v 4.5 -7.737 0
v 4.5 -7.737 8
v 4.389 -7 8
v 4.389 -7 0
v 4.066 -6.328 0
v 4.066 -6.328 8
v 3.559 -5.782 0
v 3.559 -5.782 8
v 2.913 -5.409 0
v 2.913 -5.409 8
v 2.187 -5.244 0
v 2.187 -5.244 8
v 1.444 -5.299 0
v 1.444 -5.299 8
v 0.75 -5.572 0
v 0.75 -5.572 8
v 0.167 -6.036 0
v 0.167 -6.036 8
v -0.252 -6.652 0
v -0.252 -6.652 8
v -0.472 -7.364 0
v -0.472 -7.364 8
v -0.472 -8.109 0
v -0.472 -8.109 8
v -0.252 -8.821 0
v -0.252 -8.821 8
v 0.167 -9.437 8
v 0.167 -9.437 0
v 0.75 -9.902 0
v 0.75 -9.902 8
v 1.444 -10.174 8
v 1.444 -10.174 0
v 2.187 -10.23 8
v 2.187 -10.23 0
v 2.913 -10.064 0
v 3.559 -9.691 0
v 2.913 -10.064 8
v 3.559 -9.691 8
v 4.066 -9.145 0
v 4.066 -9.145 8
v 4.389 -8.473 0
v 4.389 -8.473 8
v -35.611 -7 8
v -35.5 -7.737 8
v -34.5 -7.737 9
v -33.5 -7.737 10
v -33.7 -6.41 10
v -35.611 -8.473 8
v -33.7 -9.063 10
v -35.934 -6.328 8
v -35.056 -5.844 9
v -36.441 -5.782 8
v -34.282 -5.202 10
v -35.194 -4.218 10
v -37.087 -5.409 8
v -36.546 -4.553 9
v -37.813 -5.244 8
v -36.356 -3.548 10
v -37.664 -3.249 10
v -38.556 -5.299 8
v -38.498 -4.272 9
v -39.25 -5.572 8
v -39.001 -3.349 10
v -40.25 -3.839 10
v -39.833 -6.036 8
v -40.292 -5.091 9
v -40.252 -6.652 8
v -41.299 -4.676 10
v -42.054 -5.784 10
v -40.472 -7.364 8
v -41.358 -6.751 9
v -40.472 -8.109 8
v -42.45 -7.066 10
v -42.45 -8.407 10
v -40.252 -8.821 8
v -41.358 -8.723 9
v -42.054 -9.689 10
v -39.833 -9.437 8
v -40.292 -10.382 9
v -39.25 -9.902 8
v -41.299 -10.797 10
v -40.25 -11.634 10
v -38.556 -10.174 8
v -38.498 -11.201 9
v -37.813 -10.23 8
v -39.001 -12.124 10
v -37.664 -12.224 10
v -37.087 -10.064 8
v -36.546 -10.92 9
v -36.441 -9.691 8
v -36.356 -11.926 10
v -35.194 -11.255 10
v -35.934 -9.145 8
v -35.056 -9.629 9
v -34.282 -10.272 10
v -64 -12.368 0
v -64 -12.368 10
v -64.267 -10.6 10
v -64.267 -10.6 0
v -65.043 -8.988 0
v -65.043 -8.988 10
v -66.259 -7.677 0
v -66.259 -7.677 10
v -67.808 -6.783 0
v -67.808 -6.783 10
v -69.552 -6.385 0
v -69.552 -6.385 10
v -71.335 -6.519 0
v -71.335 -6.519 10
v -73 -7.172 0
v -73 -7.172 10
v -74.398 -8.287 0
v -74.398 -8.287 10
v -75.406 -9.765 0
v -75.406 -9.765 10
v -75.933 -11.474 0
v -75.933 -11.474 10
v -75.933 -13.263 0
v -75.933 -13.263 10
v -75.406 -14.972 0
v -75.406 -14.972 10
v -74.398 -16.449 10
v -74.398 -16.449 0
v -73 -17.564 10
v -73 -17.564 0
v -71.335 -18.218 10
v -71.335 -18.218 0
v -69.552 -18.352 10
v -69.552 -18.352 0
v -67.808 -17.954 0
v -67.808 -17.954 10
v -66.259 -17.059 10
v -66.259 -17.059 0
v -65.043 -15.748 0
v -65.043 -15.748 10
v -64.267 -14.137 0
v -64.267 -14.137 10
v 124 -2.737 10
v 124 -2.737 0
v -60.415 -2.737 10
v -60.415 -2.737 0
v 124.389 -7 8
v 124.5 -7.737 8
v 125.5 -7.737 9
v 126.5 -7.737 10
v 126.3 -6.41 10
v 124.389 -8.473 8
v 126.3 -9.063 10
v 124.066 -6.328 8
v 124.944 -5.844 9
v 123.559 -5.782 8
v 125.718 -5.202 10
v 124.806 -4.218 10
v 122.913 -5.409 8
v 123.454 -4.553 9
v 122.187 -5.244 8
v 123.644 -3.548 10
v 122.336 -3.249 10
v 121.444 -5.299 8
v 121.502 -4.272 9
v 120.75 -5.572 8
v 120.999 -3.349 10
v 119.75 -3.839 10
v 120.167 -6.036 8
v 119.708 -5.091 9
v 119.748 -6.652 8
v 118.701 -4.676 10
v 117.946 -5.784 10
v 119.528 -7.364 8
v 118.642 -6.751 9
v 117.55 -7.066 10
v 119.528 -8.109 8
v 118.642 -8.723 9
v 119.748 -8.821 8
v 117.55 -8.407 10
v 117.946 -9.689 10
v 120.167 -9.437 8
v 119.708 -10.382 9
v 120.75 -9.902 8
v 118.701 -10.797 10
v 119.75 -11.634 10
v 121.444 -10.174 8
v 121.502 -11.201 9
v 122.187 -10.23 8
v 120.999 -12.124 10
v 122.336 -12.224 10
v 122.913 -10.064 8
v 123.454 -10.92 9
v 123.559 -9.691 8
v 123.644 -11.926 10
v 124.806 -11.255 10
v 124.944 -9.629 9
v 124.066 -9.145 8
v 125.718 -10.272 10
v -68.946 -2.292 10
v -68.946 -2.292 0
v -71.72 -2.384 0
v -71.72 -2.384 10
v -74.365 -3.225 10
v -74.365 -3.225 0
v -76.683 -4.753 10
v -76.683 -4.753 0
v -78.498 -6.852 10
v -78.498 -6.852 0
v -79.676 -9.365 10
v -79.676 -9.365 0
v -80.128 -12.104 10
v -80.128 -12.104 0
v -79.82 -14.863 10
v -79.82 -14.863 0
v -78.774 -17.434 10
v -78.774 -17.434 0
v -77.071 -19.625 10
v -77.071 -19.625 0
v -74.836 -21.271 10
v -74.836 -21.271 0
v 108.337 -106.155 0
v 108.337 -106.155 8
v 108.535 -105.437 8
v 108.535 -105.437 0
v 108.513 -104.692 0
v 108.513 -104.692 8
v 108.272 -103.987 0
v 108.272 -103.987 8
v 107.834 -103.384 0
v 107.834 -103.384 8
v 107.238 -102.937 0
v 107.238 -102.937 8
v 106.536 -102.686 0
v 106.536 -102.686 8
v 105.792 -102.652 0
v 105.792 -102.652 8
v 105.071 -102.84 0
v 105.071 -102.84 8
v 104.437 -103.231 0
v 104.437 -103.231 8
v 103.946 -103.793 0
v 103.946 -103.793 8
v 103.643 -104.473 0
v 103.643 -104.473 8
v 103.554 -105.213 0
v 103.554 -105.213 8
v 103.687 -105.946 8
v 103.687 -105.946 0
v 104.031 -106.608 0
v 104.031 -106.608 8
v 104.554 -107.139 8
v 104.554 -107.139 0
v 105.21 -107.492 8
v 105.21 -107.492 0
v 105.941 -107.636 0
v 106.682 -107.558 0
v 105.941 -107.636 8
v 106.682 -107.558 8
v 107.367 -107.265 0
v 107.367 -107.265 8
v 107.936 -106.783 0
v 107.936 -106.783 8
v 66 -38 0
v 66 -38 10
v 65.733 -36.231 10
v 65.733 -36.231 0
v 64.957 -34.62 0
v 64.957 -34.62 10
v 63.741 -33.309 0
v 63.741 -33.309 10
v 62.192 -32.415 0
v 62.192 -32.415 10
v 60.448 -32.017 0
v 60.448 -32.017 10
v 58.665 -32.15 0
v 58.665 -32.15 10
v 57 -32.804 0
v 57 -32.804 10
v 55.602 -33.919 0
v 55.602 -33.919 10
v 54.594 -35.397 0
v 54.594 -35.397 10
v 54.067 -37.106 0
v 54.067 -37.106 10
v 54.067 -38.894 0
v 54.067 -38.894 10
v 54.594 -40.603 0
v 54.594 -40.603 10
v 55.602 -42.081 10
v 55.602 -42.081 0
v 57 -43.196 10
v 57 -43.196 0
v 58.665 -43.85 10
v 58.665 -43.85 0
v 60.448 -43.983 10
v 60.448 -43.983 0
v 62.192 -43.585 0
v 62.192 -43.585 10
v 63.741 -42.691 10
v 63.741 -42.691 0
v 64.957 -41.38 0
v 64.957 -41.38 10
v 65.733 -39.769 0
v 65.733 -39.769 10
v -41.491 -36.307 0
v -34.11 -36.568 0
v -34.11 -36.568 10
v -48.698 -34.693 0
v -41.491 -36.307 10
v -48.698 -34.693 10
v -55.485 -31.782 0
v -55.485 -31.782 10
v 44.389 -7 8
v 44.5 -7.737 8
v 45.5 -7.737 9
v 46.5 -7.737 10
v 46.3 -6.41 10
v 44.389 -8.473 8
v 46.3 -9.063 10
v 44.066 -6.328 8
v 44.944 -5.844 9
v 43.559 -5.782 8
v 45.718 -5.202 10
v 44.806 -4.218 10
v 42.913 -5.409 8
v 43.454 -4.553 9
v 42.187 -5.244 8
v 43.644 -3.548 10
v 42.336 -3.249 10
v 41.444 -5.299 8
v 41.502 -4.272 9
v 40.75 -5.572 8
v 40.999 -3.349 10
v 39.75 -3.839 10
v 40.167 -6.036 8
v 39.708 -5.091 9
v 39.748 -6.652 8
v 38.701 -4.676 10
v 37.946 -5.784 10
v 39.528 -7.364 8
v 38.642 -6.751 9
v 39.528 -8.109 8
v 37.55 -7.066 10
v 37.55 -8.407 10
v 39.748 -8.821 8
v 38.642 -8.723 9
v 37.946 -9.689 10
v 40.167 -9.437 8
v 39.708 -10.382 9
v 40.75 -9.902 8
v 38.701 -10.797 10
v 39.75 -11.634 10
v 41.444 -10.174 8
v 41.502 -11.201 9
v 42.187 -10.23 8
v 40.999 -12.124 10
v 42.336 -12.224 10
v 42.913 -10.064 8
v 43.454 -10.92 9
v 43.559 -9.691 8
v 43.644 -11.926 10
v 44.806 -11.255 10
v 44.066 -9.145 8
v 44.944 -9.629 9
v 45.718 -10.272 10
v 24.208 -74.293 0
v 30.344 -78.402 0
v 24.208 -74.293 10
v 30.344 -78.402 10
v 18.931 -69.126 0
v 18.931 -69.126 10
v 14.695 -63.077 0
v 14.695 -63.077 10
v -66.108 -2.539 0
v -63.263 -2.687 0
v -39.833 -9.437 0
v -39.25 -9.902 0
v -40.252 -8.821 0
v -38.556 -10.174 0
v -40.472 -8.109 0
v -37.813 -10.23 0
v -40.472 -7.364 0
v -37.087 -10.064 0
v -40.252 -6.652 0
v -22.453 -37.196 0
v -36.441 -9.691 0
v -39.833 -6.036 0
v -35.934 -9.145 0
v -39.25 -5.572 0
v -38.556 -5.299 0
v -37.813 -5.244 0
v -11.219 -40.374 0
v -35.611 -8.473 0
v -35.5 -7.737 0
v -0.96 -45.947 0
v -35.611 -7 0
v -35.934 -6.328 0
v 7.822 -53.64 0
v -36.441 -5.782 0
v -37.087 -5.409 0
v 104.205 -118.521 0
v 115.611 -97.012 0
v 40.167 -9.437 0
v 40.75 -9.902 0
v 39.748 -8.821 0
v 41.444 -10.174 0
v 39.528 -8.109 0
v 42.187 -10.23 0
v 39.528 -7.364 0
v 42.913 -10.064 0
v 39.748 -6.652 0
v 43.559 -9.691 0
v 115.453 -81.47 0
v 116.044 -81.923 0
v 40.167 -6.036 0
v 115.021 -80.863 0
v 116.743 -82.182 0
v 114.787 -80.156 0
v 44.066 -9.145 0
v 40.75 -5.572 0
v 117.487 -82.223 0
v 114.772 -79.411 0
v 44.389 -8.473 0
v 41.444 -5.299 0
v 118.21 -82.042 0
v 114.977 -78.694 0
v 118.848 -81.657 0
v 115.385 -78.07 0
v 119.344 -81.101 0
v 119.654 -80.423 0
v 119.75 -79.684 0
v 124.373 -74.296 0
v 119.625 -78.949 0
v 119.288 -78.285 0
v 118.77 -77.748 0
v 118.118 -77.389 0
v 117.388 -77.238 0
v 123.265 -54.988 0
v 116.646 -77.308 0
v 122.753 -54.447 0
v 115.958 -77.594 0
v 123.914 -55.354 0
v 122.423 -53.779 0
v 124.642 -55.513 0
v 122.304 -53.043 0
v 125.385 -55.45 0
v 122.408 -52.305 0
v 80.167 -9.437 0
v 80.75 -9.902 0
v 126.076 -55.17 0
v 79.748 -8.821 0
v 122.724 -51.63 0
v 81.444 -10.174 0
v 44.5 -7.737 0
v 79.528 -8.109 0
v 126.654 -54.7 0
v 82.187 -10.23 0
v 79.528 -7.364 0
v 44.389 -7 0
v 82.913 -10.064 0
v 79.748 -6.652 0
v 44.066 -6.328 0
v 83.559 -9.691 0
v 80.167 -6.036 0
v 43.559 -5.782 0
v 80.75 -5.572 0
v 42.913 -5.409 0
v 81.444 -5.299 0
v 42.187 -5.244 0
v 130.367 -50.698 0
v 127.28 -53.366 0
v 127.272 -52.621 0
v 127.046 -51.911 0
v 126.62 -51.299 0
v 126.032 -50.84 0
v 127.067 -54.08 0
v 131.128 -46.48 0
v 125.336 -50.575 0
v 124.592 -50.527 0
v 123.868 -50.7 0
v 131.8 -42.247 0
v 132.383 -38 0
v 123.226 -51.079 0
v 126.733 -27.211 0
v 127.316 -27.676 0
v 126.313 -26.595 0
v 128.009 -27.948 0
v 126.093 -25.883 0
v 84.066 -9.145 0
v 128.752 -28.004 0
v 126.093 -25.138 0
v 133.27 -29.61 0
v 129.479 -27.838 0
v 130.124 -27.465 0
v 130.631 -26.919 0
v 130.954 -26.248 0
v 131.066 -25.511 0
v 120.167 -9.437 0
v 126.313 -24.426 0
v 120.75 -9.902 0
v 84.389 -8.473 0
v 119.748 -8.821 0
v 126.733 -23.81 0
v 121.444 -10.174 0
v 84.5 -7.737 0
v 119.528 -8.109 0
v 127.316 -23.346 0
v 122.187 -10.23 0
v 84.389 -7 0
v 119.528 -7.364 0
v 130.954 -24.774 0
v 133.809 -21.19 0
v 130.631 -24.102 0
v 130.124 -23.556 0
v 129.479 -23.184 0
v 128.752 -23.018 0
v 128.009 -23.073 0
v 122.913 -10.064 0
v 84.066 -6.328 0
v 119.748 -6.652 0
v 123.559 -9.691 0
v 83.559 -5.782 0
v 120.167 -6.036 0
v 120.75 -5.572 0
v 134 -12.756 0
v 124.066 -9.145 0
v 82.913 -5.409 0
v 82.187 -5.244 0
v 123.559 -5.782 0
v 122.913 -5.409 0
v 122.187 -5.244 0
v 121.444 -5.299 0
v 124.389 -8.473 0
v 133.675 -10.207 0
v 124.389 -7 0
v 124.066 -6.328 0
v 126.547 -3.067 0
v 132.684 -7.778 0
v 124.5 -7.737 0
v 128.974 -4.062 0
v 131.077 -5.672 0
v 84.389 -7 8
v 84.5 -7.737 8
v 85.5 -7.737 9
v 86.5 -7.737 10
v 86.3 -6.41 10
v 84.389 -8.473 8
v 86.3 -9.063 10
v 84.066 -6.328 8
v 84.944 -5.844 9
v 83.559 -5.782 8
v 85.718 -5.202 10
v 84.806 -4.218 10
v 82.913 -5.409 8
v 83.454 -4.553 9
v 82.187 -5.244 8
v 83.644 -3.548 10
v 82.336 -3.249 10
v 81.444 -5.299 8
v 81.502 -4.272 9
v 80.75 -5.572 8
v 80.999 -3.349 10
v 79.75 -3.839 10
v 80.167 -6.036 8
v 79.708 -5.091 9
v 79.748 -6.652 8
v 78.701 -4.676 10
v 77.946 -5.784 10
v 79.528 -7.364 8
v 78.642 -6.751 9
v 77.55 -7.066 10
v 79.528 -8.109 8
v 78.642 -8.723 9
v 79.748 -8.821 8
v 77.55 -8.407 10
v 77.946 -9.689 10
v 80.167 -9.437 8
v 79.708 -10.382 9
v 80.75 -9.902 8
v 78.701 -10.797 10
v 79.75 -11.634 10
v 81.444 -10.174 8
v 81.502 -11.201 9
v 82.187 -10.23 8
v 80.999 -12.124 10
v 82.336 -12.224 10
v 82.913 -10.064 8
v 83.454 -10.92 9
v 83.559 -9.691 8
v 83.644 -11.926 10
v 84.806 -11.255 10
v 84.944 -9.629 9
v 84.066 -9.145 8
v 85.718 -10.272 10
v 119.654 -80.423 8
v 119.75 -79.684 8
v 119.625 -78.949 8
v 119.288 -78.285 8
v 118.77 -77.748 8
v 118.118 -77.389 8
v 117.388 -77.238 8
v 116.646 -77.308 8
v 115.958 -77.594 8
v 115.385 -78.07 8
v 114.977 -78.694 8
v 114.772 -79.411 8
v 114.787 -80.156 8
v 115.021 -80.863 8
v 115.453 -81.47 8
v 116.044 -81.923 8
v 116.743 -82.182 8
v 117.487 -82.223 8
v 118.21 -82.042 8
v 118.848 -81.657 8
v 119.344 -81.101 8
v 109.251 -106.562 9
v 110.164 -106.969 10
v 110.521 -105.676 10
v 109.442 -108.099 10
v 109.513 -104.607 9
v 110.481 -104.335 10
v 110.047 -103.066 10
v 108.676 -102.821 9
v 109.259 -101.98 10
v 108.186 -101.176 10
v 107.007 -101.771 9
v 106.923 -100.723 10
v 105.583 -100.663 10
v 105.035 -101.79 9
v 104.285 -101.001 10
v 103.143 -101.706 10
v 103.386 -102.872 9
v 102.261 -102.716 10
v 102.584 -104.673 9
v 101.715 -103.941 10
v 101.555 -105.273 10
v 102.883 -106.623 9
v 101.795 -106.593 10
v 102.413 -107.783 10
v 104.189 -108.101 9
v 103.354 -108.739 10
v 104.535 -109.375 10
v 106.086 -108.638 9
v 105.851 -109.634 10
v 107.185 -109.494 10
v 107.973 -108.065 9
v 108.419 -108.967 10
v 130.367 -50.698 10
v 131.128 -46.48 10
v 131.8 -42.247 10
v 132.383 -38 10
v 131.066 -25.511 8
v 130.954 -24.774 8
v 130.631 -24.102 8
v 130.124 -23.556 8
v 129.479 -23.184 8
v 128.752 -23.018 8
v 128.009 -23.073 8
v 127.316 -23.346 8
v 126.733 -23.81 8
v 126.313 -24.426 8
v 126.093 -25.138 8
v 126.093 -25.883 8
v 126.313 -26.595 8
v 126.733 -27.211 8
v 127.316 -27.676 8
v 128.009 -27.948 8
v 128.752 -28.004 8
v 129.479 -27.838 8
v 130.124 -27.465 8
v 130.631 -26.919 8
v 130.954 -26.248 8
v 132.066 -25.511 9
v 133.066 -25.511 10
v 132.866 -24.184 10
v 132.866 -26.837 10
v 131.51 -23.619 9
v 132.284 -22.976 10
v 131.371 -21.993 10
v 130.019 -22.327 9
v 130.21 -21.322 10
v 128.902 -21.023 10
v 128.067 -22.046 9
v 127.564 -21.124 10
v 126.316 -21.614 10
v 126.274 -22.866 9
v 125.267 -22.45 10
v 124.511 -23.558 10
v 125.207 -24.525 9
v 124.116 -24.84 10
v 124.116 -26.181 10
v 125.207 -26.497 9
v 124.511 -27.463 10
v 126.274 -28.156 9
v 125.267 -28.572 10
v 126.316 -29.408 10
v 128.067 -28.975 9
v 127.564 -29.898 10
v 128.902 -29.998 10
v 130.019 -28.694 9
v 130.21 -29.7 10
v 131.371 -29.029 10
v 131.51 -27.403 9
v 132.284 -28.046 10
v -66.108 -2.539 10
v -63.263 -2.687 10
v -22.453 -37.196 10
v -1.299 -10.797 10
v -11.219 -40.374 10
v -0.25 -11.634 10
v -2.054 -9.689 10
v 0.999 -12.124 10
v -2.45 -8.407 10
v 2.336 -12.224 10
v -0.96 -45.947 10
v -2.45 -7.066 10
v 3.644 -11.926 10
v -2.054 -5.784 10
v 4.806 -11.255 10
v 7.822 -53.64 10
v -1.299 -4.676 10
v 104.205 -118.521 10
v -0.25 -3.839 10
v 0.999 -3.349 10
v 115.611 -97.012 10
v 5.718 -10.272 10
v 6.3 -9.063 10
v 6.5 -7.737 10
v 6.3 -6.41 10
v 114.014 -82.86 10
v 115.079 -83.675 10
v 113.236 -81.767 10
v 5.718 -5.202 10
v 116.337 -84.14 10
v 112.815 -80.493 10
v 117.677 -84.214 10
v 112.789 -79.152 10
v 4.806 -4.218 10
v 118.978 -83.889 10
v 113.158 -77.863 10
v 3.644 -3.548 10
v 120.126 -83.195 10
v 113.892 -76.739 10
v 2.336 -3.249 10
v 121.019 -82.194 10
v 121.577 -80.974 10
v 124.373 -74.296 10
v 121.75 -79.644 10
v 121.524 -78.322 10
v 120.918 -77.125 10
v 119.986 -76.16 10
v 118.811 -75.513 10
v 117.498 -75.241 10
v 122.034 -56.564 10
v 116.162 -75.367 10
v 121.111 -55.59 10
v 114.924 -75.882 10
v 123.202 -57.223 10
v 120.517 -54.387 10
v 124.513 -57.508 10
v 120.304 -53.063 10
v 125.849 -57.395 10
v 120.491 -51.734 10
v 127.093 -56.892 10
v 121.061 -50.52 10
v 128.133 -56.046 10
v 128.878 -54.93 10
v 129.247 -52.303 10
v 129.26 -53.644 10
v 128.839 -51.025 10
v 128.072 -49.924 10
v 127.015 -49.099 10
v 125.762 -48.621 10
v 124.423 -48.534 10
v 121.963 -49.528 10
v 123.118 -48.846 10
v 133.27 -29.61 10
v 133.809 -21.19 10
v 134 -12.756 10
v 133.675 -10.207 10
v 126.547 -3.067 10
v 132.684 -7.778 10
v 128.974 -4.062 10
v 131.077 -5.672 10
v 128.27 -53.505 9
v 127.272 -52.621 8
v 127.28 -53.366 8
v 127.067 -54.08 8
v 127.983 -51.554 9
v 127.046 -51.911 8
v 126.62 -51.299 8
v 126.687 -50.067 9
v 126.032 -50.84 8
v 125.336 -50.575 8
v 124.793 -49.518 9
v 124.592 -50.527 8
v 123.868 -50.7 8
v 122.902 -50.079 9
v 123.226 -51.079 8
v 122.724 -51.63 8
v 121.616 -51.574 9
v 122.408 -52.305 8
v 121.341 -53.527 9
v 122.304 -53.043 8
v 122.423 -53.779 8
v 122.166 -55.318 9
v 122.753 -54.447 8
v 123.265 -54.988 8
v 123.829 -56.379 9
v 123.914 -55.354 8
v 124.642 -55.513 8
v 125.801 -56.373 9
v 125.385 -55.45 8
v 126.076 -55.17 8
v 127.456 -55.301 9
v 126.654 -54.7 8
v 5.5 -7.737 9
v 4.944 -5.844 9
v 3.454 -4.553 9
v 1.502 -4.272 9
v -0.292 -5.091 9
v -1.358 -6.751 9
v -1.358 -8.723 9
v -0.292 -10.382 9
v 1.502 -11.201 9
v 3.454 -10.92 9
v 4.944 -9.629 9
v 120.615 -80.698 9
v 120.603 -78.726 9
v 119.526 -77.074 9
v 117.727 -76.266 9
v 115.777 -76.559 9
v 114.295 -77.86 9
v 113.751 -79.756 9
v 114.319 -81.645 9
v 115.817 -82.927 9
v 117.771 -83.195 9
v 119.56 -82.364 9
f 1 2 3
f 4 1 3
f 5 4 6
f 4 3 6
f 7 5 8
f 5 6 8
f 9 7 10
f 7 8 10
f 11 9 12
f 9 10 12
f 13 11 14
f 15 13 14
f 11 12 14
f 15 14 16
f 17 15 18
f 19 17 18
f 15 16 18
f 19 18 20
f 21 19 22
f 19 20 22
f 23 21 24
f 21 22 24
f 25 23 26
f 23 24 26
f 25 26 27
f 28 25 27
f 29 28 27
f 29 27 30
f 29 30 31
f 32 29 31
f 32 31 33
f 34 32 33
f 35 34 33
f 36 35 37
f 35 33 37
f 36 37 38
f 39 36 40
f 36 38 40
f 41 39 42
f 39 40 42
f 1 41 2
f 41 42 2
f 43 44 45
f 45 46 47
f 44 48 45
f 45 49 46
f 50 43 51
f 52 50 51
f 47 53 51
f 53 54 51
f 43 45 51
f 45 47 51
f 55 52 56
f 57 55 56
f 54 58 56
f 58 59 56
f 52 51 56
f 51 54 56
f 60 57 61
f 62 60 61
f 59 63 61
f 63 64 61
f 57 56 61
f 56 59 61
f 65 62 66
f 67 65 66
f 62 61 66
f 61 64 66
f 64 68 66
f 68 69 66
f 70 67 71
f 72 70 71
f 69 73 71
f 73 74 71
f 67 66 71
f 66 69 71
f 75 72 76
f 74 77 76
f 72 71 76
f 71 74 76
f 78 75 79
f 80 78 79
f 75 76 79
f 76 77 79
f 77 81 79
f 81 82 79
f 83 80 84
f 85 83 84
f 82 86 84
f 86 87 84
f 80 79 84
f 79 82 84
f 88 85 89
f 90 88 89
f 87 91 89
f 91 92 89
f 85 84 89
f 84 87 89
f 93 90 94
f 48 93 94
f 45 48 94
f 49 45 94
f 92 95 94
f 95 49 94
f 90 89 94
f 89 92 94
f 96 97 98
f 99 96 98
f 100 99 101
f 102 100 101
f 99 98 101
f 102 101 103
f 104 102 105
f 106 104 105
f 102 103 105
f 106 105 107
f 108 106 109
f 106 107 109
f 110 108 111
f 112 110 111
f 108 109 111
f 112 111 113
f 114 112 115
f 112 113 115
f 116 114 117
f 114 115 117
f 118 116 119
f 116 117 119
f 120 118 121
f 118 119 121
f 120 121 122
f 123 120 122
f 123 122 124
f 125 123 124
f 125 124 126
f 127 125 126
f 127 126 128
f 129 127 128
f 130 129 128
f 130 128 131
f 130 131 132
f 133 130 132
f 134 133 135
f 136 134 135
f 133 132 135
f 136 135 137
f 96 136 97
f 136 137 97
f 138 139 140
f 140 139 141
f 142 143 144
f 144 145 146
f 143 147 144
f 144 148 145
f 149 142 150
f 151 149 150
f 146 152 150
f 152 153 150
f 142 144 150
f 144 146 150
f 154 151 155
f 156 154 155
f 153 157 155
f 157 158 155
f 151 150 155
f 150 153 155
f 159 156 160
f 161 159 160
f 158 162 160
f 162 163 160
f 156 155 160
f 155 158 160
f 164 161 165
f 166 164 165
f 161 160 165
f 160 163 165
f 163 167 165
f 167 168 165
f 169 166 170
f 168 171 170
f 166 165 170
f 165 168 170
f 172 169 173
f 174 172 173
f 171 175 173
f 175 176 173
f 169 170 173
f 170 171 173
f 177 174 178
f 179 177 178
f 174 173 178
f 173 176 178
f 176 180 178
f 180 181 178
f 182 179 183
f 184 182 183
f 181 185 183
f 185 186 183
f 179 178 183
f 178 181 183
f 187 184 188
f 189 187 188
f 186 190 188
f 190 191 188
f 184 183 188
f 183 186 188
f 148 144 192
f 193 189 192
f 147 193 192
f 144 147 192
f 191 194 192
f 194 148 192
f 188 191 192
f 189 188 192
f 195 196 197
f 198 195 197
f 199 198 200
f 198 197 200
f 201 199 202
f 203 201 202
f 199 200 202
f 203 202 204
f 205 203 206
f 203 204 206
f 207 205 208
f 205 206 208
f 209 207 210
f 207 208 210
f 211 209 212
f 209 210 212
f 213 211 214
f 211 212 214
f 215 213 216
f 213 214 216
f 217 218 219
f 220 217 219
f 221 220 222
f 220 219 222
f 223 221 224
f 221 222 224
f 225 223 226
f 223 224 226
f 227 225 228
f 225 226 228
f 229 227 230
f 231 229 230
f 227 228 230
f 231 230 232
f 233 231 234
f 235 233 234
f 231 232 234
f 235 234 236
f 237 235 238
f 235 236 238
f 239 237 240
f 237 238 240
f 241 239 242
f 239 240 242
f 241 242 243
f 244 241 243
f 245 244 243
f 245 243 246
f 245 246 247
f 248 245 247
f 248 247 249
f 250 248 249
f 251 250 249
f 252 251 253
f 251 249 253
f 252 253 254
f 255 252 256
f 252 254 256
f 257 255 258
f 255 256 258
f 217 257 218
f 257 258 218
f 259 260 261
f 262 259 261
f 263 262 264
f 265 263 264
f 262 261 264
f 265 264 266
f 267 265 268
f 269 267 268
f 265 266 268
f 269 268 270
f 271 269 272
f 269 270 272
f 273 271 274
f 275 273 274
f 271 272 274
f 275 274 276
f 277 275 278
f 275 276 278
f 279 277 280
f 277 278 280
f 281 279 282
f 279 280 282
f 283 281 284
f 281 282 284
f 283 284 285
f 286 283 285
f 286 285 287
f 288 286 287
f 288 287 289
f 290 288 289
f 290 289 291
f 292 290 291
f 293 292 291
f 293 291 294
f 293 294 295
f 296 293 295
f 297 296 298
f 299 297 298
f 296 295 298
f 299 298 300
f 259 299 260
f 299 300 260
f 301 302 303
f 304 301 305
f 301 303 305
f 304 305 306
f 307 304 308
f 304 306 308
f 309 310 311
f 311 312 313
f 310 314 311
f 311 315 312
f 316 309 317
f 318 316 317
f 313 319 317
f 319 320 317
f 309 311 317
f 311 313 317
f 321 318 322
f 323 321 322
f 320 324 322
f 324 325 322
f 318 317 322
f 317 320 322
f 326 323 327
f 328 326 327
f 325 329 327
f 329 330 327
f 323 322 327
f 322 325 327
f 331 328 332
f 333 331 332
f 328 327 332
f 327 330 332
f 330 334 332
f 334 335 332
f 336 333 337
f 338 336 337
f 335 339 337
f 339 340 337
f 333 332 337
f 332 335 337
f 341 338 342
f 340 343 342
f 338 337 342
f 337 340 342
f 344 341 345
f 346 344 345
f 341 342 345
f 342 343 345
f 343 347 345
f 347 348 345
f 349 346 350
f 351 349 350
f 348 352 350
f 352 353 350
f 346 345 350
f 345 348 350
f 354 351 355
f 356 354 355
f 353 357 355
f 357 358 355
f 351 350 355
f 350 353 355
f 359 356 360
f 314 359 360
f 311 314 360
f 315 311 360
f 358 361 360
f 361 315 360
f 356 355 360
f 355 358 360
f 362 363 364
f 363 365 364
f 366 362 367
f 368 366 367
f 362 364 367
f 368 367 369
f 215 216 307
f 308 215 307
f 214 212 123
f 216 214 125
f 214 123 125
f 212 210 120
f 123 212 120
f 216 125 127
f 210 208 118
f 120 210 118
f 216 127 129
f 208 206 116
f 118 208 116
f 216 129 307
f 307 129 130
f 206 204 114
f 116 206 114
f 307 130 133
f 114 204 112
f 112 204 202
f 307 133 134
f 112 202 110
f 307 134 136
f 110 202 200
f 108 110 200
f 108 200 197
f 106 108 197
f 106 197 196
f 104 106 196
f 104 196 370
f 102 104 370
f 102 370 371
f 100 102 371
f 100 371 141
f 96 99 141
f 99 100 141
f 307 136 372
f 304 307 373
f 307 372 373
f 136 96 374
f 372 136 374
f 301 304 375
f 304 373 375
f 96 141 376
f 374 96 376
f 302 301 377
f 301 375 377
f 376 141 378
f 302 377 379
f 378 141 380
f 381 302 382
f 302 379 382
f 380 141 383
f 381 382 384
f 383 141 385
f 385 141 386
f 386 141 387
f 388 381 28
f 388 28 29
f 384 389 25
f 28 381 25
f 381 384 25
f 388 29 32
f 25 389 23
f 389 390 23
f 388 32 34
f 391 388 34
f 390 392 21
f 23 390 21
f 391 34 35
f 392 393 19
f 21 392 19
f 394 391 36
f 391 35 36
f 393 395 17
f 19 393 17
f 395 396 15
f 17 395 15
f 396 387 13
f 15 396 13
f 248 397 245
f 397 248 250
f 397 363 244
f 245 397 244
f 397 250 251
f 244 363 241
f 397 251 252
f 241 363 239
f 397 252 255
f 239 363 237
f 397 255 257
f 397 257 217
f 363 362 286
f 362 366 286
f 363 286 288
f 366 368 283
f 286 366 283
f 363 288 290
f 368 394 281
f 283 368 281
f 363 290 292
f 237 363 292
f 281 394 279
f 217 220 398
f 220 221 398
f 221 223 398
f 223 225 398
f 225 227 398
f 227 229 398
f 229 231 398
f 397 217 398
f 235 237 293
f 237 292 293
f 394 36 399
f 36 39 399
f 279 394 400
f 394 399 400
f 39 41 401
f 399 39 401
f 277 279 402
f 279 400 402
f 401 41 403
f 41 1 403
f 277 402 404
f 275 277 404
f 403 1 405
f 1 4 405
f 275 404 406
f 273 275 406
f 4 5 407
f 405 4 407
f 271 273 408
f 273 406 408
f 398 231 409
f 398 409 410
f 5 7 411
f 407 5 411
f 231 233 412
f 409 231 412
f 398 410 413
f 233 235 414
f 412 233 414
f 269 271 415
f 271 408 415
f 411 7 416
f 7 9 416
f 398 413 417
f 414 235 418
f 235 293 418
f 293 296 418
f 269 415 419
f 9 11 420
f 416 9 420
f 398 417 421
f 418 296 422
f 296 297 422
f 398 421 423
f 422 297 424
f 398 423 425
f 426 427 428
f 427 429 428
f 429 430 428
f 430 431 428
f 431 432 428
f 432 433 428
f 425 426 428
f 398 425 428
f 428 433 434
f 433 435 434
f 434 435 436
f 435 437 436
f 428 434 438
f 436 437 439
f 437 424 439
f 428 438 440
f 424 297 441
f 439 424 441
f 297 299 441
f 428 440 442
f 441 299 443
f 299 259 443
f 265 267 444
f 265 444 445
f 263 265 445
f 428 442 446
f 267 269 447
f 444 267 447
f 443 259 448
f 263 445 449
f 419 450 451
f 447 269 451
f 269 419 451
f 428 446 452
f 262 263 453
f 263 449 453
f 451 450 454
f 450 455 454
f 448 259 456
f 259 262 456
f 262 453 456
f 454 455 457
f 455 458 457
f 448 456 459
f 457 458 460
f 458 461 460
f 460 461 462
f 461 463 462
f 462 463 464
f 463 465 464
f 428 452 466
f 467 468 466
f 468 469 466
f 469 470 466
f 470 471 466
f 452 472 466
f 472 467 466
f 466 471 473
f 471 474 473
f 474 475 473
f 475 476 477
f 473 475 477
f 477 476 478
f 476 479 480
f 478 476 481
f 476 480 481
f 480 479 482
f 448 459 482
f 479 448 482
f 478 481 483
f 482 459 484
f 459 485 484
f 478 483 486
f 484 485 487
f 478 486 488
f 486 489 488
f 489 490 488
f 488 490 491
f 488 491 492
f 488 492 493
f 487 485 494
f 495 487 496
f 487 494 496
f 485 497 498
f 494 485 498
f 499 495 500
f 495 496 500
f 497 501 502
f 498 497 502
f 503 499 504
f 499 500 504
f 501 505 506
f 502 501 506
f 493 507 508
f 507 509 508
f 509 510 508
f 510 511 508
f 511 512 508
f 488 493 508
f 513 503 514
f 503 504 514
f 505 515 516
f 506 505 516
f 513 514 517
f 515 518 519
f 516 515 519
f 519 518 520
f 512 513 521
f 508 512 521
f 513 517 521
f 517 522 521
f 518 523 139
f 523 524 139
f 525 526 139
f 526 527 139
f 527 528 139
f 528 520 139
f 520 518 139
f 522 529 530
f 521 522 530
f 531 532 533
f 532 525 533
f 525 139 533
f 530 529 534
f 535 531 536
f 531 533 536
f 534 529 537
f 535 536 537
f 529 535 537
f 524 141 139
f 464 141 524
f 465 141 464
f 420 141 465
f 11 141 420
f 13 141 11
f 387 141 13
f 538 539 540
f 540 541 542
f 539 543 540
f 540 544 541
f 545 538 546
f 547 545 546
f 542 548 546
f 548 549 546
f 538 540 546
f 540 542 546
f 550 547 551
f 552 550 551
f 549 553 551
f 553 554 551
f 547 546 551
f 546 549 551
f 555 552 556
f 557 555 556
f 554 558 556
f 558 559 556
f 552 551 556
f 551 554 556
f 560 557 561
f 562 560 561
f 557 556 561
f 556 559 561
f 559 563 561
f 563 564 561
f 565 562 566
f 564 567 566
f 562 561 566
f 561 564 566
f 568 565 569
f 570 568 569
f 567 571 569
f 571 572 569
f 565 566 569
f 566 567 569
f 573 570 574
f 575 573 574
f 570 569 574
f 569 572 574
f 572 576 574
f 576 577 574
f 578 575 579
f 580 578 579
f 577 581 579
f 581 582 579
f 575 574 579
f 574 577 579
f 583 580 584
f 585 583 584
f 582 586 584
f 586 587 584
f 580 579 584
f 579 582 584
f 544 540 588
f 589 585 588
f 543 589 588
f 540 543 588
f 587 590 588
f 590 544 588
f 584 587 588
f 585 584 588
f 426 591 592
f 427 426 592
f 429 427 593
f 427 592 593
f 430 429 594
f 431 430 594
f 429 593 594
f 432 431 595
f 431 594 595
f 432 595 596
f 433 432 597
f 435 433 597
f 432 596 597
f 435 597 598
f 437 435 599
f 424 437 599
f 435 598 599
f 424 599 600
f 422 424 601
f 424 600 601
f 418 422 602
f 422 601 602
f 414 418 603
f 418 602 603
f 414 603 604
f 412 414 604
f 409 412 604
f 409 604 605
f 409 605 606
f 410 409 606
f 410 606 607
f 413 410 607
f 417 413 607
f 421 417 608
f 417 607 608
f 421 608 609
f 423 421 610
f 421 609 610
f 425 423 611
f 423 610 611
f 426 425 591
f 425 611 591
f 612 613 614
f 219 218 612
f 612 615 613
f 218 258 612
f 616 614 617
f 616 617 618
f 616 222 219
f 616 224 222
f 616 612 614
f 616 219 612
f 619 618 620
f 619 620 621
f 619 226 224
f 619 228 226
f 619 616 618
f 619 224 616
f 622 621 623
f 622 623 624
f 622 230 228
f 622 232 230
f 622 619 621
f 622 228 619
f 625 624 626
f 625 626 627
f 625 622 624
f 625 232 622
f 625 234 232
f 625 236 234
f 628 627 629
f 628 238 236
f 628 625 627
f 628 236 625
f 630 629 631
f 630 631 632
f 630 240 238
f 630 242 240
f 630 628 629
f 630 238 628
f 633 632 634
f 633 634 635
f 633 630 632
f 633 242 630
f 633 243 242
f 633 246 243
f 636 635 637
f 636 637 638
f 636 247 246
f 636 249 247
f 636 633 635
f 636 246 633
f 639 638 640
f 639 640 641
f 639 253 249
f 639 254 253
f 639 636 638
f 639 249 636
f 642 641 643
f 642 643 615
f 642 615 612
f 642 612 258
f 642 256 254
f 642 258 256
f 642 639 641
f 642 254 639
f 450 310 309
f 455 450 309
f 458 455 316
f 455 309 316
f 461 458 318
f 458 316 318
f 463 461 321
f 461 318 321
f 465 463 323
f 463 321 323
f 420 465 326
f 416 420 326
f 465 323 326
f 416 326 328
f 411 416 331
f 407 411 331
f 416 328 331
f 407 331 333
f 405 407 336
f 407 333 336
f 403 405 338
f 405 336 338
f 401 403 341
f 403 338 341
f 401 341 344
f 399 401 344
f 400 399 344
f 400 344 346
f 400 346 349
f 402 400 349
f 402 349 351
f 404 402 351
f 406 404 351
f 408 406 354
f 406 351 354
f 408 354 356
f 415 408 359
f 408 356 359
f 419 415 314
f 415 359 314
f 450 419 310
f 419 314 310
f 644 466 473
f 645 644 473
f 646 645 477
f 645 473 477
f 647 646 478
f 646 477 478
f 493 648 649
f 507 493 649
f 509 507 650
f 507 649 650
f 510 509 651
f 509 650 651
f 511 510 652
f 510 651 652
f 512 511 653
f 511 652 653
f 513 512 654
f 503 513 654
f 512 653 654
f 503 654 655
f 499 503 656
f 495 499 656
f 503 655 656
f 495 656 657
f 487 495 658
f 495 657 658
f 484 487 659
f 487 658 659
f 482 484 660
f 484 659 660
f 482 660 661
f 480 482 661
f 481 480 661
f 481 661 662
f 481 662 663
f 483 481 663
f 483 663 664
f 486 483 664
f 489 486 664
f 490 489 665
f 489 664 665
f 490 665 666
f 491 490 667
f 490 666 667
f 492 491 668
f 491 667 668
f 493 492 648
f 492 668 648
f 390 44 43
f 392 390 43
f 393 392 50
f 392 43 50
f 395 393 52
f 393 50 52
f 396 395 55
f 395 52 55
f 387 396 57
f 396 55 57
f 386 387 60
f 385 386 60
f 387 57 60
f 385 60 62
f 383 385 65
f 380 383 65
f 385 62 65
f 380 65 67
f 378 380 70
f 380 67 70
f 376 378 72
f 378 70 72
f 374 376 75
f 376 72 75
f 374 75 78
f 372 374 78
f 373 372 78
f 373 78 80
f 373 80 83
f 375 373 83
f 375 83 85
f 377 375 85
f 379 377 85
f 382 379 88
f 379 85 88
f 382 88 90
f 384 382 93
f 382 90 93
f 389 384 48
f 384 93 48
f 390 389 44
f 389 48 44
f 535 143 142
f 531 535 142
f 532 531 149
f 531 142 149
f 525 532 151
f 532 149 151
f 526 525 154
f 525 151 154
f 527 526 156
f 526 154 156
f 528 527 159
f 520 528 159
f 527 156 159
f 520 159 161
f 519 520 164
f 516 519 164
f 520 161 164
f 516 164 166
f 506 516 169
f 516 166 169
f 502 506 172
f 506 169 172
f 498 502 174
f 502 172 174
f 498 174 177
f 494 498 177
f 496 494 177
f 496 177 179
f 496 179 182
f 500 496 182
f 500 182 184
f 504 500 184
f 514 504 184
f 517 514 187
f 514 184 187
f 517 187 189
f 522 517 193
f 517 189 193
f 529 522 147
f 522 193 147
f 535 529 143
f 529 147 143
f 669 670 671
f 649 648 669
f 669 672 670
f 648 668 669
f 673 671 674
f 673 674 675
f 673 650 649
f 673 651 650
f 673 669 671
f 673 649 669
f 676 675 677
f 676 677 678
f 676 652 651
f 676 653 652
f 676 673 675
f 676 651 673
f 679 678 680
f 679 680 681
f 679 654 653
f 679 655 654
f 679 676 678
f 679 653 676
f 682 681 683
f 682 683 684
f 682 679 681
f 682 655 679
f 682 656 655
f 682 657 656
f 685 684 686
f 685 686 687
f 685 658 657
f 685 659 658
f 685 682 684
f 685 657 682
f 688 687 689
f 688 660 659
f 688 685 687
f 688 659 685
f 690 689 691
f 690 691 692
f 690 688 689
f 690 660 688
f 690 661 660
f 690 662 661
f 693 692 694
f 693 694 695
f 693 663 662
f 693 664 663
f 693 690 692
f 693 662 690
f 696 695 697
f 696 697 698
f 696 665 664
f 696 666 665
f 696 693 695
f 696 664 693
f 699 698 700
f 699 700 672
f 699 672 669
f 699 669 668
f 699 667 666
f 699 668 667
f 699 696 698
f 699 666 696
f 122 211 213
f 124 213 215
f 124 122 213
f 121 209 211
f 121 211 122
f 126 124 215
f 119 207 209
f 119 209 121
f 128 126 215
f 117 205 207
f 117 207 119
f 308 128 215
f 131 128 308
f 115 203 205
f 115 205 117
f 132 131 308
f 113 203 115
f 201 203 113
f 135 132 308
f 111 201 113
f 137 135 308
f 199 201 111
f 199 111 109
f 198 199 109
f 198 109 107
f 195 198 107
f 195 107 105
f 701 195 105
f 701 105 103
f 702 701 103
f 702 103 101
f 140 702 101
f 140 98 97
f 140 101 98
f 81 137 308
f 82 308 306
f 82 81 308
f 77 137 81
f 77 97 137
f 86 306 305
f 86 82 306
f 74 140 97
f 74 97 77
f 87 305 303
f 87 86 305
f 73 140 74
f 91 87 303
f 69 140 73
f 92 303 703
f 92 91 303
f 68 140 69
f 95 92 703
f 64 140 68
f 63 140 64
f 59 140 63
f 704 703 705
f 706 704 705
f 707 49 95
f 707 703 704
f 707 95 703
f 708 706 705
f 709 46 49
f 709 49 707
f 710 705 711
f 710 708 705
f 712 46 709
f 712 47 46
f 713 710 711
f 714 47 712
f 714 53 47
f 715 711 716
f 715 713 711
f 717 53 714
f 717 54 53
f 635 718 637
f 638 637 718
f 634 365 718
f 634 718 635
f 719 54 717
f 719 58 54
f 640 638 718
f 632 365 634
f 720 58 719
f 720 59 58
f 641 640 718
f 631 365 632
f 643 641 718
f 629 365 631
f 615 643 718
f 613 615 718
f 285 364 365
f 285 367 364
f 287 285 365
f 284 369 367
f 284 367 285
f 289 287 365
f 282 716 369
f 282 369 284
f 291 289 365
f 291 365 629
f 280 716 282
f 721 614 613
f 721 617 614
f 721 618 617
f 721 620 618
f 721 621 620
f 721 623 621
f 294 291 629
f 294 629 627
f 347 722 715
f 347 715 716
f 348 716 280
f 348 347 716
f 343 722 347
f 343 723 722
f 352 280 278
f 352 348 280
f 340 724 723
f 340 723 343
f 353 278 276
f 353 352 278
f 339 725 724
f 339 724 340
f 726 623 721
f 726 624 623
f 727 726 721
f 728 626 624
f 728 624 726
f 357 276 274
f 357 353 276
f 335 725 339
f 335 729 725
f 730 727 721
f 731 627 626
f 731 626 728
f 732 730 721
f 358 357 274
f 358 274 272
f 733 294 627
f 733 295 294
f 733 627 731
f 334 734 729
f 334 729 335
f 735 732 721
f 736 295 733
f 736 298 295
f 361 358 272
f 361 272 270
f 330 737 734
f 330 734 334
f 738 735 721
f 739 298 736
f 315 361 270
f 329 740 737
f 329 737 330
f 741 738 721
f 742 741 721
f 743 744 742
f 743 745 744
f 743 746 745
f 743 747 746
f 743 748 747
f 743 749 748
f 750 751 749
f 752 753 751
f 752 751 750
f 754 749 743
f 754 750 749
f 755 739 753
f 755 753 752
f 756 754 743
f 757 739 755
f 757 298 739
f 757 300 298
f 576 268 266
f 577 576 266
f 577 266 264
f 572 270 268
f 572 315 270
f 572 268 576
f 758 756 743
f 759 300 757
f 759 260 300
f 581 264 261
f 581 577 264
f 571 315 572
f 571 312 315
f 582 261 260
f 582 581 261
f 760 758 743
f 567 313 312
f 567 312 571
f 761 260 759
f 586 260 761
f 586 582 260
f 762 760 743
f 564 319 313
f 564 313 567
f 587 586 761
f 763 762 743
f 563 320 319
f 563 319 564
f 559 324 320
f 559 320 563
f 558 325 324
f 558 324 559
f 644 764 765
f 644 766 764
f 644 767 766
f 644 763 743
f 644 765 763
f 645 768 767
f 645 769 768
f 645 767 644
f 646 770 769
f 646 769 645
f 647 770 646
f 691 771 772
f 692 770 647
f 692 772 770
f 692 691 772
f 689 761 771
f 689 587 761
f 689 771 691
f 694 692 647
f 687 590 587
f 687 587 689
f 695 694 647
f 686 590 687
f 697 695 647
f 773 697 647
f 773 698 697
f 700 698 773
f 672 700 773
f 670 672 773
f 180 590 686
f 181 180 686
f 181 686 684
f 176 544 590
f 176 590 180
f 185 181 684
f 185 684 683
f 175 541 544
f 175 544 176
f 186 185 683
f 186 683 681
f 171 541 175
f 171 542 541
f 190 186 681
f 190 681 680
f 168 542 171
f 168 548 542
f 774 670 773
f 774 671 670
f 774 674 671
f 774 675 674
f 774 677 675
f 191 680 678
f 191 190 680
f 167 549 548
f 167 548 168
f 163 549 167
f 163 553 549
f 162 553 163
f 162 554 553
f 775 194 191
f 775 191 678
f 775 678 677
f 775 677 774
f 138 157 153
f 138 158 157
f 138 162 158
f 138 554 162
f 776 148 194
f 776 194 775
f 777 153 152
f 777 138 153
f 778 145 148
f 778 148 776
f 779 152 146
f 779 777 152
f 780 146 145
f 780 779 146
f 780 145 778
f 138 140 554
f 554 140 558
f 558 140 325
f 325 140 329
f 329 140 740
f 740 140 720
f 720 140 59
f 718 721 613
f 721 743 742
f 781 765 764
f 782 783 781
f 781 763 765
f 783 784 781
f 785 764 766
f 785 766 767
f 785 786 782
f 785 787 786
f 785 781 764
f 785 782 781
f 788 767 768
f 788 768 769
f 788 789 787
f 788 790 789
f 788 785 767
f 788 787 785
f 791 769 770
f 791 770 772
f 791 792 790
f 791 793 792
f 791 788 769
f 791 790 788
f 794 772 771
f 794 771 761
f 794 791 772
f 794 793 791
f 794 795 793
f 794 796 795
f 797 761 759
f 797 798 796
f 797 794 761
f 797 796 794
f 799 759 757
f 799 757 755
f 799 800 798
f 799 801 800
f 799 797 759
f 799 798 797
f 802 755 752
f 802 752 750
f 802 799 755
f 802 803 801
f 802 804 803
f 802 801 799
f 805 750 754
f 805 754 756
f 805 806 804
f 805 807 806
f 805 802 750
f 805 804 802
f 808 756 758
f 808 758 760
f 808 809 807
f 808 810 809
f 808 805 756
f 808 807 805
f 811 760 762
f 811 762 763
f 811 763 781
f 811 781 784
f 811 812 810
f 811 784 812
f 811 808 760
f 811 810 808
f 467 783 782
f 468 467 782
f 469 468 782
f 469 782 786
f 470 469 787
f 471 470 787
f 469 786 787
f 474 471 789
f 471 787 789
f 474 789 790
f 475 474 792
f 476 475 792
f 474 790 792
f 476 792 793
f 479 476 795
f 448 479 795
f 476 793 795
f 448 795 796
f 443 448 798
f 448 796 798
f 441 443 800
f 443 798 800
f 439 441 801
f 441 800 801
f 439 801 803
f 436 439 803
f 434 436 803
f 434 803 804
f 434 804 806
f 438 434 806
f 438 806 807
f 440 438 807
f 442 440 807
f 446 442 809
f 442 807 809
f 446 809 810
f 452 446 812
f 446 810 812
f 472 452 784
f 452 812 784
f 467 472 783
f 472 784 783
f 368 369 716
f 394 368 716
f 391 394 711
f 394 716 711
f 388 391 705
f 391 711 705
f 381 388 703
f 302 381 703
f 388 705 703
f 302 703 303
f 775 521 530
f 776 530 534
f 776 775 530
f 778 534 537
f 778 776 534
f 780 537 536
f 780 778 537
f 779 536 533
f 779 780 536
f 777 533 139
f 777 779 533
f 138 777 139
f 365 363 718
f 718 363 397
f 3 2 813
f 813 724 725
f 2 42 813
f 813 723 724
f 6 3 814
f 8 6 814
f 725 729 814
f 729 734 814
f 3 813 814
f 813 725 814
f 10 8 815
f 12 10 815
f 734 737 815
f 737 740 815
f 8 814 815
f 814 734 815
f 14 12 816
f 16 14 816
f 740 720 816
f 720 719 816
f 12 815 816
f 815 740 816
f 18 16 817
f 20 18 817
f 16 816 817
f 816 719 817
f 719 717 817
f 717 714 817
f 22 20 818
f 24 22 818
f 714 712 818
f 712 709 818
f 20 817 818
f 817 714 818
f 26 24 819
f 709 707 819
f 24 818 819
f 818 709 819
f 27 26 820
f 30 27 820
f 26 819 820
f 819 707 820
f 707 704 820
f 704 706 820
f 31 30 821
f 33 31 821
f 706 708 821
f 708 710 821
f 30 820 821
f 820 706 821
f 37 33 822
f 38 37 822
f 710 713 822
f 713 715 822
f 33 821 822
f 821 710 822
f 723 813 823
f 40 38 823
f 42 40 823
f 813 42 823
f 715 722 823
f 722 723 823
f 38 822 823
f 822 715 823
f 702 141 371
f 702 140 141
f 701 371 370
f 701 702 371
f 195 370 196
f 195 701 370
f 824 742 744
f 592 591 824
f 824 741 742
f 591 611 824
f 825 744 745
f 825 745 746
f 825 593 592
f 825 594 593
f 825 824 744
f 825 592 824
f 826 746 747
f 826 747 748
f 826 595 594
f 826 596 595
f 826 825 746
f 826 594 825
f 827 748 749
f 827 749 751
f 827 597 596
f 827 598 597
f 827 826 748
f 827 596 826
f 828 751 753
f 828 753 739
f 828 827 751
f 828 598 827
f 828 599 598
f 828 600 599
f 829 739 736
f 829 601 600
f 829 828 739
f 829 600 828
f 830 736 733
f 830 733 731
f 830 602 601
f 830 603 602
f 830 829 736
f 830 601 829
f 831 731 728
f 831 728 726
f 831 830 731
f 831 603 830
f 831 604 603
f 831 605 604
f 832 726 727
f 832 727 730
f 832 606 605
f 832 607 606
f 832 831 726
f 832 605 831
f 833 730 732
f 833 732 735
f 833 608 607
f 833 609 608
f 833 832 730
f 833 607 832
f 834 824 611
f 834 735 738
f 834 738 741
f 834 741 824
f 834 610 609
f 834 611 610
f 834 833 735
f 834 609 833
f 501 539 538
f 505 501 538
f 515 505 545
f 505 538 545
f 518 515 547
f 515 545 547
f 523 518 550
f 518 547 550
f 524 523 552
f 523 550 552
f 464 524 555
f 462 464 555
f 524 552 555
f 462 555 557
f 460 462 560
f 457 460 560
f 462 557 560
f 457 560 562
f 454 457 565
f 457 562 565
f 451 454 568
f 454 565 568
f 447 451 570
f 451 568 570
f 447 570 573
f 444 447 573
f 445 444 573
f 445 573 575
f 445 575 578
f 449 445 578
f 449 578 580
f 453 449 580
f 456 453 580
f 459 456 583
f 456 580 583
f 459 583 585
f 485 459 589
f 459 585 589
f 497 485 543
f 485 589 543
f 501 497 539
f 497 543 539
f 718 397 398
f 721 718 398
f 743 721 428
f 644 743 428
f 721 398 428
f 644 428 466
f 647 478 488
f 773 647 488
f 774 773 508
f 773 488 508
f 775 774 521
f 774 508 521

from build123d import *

# Parameters (mm, degrees)
SKETCH1_R                    = 3
BOSS_EXTRUDE1_DEPTH          = 10
SKETCH2_R                    = 6
CUT_EXTRUDE1_DEPTH           = 10
SKETCH3_R                    = 52.728139035
CUT_EXTRUDE2_DEPTH           = 10
FILLET1_R                    = 40
SKETCH4_R                    = 2.5
CUT_EXTRUDE3_DEPTH           = 10
CHAMFER1_SIZE                = 2
FILLET2_R                    = 10
LPATTERN3_COUNT              = 5
LPATTERN3_PITCH              = 40
CHAMFER1_OF_LPATTERN3_SIZE   = 2
SKETCH5_R                    = 2.5
CUT_EXTRUDE4_DEPTH           = 10
CHAMFER2_SIZE                = 2
CIRPATTERN2_COUNT            = 45
CHAMFER2_OF_CIRPATTERN2_SIZE = 2
FILLET4_R                    = 82


with BuildPart() as part:
    # Sketch1 → Boss-Extrude1 (new body)
    with BuildSketch(Plane.XY):
        with BuildLine():
            Line((134, -12.3683), (134, -2.7366))
            Line((134, -2.7366), (-66.856482862, -2.7366))
            ThreePointArc((-66.856482862, -2.7366), (-79.305955572, -8.361988007), (-74.83591229, -21.271406043))
            Line((-74.83591229, -21.271406043), (104.205340418, -118.521488224))
            ThreePointArc((104.205340418, -118.521488224), (120.331391511, -85.784656527), (130.366665775, -50.69843496))
            ThreePointArc((130.366665775, -50.69843496), (131.475070851, -44.365109618), (132.383339124, -38))
            ThreePointArc((132.383339124, -38), (133.595433619, -25.209616495), (134, -12.3683))
        make_face()
        with Locations((60, -38)):
            Circle(SKETCH1_R, mode=Mode.SUBTRACT)
        with Locations((-70, -12.3683)):
            Circle(SKETCH1_R, mode=Mode.SUBTRACT)
    extrude(amount=BOSS_EXTRUDE1_DEPTH)

    # Sketch2 → Cut-Extrude1 (cut)
    with BuildSketch(Plane.XY.offset(10)):
        with Locations((60, -38)):
            Circle(SKETCH2_R)
        with Locations((-70, -12.3683)):
            Circle(SKETCH2_R)
    extrude(amount=-CUT_EXTRUDE1_DEPTH, mode=Mode.SUBTRACT)

    # Sketch3 → Cut-Extrude2 (cut)
    with BuildSketch(Plane.XY.offset(10)):
        with Locations((-31.102013179, -89.20992017)):
            Circle(SKETCH3_R)
    extrude(amount=-CUT_EXTRUDE2_DEPTH, mode=Mode.SUBTRACT)

    # Fillet1
    fillet1_edges = [part.edges().sort_by_distance(p)[0] for p in [
        (18.78007916, -72.120932196, 5),
        (-43.920680471, -38.063674805, 5),
    ]]
    fillet(fillet1_edges, radius=FILLET1_R)

    # Sketch4 → Cut-Extrude3 (cut)
    with BuildSketch(Plane.XY.offset(10)):
        with Locations((122, -7.7366)):
            Circle(SKETCH4_R)
    cut_extrude3 = extrude(amount=-CUT_EXTRUDE3_DEPTH, mode=Mode.SUBTRACT)

    # Chamfer1
    chamfer1_edges = [part.edges().sort_by_distance(p)[0] for p in [
        (119.5, -7.7366, 10),
    ]]
    chamfer(chamfer1_edges, length=CHAMFER1_SIZE)

    # Fillet2
    fillet2_edges = [part.edges().sort_by_distance(p)[0] for p in [
        (134, -2.7366, 5),
    ]]
    fillet(fillet2_edges, radius=FILLET2_R)

    # LPattern3: Cut-Extrude3 ×5
    with Locations(*[(-i * LPATTERN3_PITCH, 0, 0) for i in range(1, LPATTERN3_COUNT)]):
        add(cut_extrude3, mode=Mode.SUBTRACT)

    # Chamfer1 of LPattern3
    chamfer1_of_lpattern3_edges = [part.edges().sort_by_distance(p)[0] for p in [
        (79.5, -7.7366, 10),
        (39.5, -7.7366, 10),
        (-0.5, -7.7366, 10),
        (-40.5, -7.7366, 10),
    ]]
    chamfer(chamfer1_of_lpattern3_edges, length=CHAMFER1_OF_LPATTERN3_SIZE)

    # Sketch5 → Cut-Extrude4 (cut)
    with BuildSketch(Plane.XY.offset(10)):
        with Locations((128.565543545, -25.510785173)):
            Circle(SKETCH5_R)
    cut_extrude4 = extrude(amount=-CUT_EXTRUDE4_DEPTH, mode=Mode.SUBTRACT)

    # Chamfer2
    chamfer2_edges = [part.edges().sort_by_distance(p)[0] for p in [
        (126.065543545, -25.510785173, 10),
    ]]
    chamfer(chamfer2_edges, length=CHAMFER2_SIZE)

    # CirPattern2: Cut-Extrude4 ×45 about axis, 41 skipped
    cirpattern2_axis = Axis((-70, -12.3683, 10), (0, 0, 1))
    add([cut_extrude4.rotate(cirpattern2_axis, i * 360 / CIRPATTERN2_COUNT) for i in range(1, CIRPATTERN2_COUNT) if i not in (1, 2, 3, 4, 5, 6, 7, 8, 9, 10, 11, 12, 13, 14, 15, 16, 17, 18, 19, 20, 21, 22, 23, 24, 25, 26, 27, 28, 29, 30, 31, 32, 33, 34, 35, 36, 37, 38, 39, 40, 41)], mode=Mode.SUBTRACT)

    # Chamfer2 of CirPattern2
    chamfer2_of_cirpattern2_edges = [part.edges().sort_by_distance(p)[0] for p in [
        (103.769256405, -104.121598636, 10),
        (114.847737042, -79.044655576, 10),
        (122.328366738, -52.669933097, 10),
    ]]
    chamfer(chamfer2_of_cirpattern2_edges, length=CHAMFER2_OF_CIRPATTERN2_SIZE)

    # Fillet4
    fillet4_edges = [part.edges().sort_by_distance(p)[0] for p in [
        (-66.856482862, -2.7366, 5),
    ]]
    fillet(fillet4_edges, radius=FILLET4_R)


solid = part.part
